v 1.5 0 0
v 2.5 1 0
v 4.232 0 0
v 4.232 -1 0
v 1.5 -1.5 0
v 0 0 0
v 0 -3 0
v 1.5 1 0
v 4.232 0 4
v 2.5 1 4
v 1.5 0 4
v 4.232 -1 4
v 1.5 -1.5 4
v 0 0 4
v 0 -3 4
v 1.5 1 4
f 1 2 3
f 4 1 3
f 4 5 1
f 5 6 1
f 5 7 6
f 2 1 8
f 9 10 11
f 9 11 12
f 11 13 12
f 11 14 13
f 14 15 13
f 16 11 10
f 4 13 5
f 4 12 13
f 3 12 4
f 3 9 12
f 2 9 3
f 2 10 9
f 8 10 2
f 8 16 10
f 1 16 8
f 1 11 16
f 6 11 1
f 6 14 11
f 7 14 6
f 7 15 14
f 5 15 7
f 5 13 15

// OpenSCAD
/*simple Snap library based on "Snap-Fit Joints for Plastics - A Design Guid" by Bayer MaterialScience LLC 
  http://fab.cba.mit.edu/classes/S62.12/people/vernelle.noel/Plastic_Snap_fit_design.pdf
 
 on http://www.thingiverse.com/thing:1860118
 
    by fpetrac Fausto Petraccone fpetrac@gmail.com 
    Licensed under the Creative Commons - Attribution - Non-Commercial license.
*/

/*Rev
    SnapLib 0.36.scad: added SnapHoleY function  
    SnapLib 0.35.scad: on RSnapY added a check to avioid interference of lobes during closure; on RRSnappY added a check to avioid overlapped lobes.
    SnapLib 0.30.scad  added function Hsnap and Snap to calculate the snap H or Y for cantilever snap
    SnapLib 0.25.scad  added Scale factor f to reduce the calculate value h or y (this mantain the snap on unbreakable zone when f>1)
    Snaprofile = 12; // [1:MXL, 2:40DP, 3:XL, 4:H, 5:T2.5, 6:T5, 7:T10, 8:AT5, 9:HTD_3mm, 10:HTD_5mm, 11:HTD_8mm, 12:GT2_2mm, 13:GT2_3mm, 14:GT2_5mm]
pLib 0.20.scad  Bug Fix
    SnapLib 0.10.scad  addedroot=5 RSnapY RRSnapY
    SnapLib 0.00.scad  first release
*/

/*
eps=0.5*6/100;//Elongation at break of PLA=6%
eps=0.5*12/100;//Elongation at break of ABS=12%
eps=0.5*18/100;//Elongation at break of PETG=18%
*/
//**************** variable *****************
eps=0.5*6/100;//Elongation at break of PLA=6%
la=1.5;  //arm length(x)
root=4; //arm thickness at root
uCut=1; //undercut depth(deflection)
l=30;   //overall length of clip
w=5;    //arm width
f=1;    //factor
lobes=6;    //number of lobes in circular clips
help=false; //help message
angle=30;   //taper angle
h=root; //arm root thickness
Pr=2;   //thickness ratio



//******************* functions **************************
//function arm(l=10,w=4)=[[0,0],[l,0],[l,-w/2],[0,-w]];
function arm(la=la,root=3,y=1,xLand=1,angle=30,yLand=1)=[[0,0],[la,0],[la,y],[la+xLand,y],[la+xLand+y/tan(angle),0],[la+xLand+y/tan(angle),-yLand],[la,-root/2],[0,-root]];
function hArm(la=10,y=1,root=3,angle=30)=[[0,0],[la,0],[la,y],[la+y,y],[la+y+(y+root/4)/tan(angle),-root/4],[la,-root/2],[0,-root]];
function Hsnap(la,y,f)= (1.09/f)*(eps*pow(la,2))/(y);
function Ysnap(la,root,f)= (1.09/f)*(eps*pow(la,2))/(root);

//Example: 
//SnapY(la=10,root=5,uCut=1,l=30,w=4,help=true);


//y=min(Ysnap(la,root,f),uCut);
//echo("y =",y);

profile = 1; // [1:SnapY, 2:SnapH, 3:SnapHoleY, 4:RSnapY, 5:RRSnapY,6:null]
if ( profile == 1 ) {SnapY(la=10,root=3,uCut=1,l=30,w=4,f=1,help=false ); }
if ( profile == 2 ) {SnapH(la=10,root=3,uCut=1,angle=30,w=4,f=1,help=false); }
if ( profile == 3 ) {SnapHoleY(la=10,root=1,angle=30,w=5,f=1,Pr); }
if ( profile == 4 ) {RSnapY(la=10,root=3,angle=30,lobes=6,r2=5,f=1,K2=2); }
if ( profile == 5 ) {RRSnapY(la=10,root=3,angle=30,lobes=6,r2=5,f=1,K1=2); }



//SnapH(l=length,y,a=angle,b=width,f=1) Define y calculate h and divide the calculte h value to a factor f

//********************************************************
module SnapH(la=10,uCut=1,root=5,angle=30,w=4,f=1,help=false)   
{
    y=min(Ysnap(la,root,f),uCut); echo("y = ",y);
    root=Hsnap(la,y,f); //(length,depth,factor)
linear_extrude(height = w, center = f, convexity = 10, twist = 0)
polygon(arm());
}

//SnapY(la,root,uCut,l,w,f,help) 
//Define root calculate y and divide the calculated y value by a factor f

//********************************************************
module SnapY(la=10,root=3,uCut=1,l=30,w=4,f=1,help=false){
    helpText="Usage:\nmodule SnapY(la,root,uCut,l,w,f,help=false)\n
    la=length of clip from root of arm to hook(x)\n
    root=width of arm at root,\n
    uCut=depth of undercut(hook protrusion)\n
    l=overall length of clip(x)\n
    w=width of arm(z)\n
    f=factor)";
    if(help)echo(helpText);
    y=min(Ysnap(la,root,f),uCut);
//     translate([la,0,0])linear_extrude(w)polygon(hook(root/2,y,1,l,1));
    linear_extrude(w)polygon(arm());
}

//********************************************************
//SnapHoleY(l,h,a,b,f=1,Pr=2) Define h calculate y and divide the calculate y value to a factor f the total hole depth is h*PR
//SnapHoleY(la=10,root=2,angle=30,w=4,Pr=2,f=1);

module SnapHoleY(la=10,root=3,angle=30,uCut=1,l=30,w=3,f=1,Pr=2){
    helpText="Usage:\nmodule SnapHoleH(la,root,uCut,l,w,f,Pr,help=false)\n
    la=length of clip from root of arm to hook(x)\n
    root=width of arm at root,\n
    uCut=depth of undercut(hook protrusion)\n
    l=overall length of clip(x)\n
    w=width of arm(z)\n
    f=factor\n
    Pr=thickness ratio";
    
    if(help)echo(helpText);  
    y=min(Ysnap(la,root,f),uCut); 
    YY=Pr*root;//depth Y;
    echo(Pr,root);
    XX=1.1*(y+(y+root/4)/tan(angle)); //total height +10%
    ZZ=0+w; //width plus tolerance
 //   union(){
        translate([0,-YY,(w-ZZ)/2])cube([la,YY,ZZ],center=false); //stem
        translate([la,-YY,(w-ZZ)/2])cube([XX,YY+y,ZZ],center=false);//head
 //   }    
 }


//Define h calculate y and divide the calculated value to f
 
//********************************************************
module RSnapY(la,root,angle,lobes,r2=0,f=1,K2=2)   
{
    Theta=180/lobes;
    y=(1.64/f)*K2*(eps*pow(la,2))/(r2);
    p=y;
//    if(((r2-root)>y)&&(root<r2)){ //(r2-root)>y should be (r2-root/2)>y and  root<r2 for scad problem
    assert(r2-root>y&&root<r2,"WARNING:");
    for(f=[0:1:lobes])
        rotate([0,0,Theta*2*f])
        rotate_extrude(angle = Theta, convexity = 2,$fn=200)
        translate([r2,0,0])
        mirror([1,-1,0])
        polygon(hArm());
 /*   }
    else{
      echo ("WARNING:");
      echo("y should be < r2-root,  y = ",y,", r2-root = ",r2-root);
      echo("root should be < r2 ");
    }*/
}
//Define h calculate y and divide the calculated value to f

//********************************************************
module RRSnapY(la,root,angle,lobes,r2=5,f=1,K1=2)
{
    Theta=180/lobes;
    y=(1.64/f)*K1*(eps*pow(la,2))/(r2);
    p=y;
    echo("y is", y);
    echo("r1/r2",(r2-h)/r2);
    echo("Theta", Theta);
    echo("r2-y",(r2-y));
    if(y<r2){
      for(f=[0:1:lobes])
          rotate([0,180,Theta*2*f])
              rotate_extrude(angle = Theta, convexity = 2,$fn=200)
                  translate([r2,0,0])
                      mirror([1,1,0])
                          polygon([[0,0],[la,0],[la,y],[la+p,y],[la+p+(y+root/4)/tan(angle),-root/4],[la,-root/2],[0,-root]]);
  }
      else{
      echo ("<b>WARNING:</b>");
      echo("y should be < r2 ");
      }
}
